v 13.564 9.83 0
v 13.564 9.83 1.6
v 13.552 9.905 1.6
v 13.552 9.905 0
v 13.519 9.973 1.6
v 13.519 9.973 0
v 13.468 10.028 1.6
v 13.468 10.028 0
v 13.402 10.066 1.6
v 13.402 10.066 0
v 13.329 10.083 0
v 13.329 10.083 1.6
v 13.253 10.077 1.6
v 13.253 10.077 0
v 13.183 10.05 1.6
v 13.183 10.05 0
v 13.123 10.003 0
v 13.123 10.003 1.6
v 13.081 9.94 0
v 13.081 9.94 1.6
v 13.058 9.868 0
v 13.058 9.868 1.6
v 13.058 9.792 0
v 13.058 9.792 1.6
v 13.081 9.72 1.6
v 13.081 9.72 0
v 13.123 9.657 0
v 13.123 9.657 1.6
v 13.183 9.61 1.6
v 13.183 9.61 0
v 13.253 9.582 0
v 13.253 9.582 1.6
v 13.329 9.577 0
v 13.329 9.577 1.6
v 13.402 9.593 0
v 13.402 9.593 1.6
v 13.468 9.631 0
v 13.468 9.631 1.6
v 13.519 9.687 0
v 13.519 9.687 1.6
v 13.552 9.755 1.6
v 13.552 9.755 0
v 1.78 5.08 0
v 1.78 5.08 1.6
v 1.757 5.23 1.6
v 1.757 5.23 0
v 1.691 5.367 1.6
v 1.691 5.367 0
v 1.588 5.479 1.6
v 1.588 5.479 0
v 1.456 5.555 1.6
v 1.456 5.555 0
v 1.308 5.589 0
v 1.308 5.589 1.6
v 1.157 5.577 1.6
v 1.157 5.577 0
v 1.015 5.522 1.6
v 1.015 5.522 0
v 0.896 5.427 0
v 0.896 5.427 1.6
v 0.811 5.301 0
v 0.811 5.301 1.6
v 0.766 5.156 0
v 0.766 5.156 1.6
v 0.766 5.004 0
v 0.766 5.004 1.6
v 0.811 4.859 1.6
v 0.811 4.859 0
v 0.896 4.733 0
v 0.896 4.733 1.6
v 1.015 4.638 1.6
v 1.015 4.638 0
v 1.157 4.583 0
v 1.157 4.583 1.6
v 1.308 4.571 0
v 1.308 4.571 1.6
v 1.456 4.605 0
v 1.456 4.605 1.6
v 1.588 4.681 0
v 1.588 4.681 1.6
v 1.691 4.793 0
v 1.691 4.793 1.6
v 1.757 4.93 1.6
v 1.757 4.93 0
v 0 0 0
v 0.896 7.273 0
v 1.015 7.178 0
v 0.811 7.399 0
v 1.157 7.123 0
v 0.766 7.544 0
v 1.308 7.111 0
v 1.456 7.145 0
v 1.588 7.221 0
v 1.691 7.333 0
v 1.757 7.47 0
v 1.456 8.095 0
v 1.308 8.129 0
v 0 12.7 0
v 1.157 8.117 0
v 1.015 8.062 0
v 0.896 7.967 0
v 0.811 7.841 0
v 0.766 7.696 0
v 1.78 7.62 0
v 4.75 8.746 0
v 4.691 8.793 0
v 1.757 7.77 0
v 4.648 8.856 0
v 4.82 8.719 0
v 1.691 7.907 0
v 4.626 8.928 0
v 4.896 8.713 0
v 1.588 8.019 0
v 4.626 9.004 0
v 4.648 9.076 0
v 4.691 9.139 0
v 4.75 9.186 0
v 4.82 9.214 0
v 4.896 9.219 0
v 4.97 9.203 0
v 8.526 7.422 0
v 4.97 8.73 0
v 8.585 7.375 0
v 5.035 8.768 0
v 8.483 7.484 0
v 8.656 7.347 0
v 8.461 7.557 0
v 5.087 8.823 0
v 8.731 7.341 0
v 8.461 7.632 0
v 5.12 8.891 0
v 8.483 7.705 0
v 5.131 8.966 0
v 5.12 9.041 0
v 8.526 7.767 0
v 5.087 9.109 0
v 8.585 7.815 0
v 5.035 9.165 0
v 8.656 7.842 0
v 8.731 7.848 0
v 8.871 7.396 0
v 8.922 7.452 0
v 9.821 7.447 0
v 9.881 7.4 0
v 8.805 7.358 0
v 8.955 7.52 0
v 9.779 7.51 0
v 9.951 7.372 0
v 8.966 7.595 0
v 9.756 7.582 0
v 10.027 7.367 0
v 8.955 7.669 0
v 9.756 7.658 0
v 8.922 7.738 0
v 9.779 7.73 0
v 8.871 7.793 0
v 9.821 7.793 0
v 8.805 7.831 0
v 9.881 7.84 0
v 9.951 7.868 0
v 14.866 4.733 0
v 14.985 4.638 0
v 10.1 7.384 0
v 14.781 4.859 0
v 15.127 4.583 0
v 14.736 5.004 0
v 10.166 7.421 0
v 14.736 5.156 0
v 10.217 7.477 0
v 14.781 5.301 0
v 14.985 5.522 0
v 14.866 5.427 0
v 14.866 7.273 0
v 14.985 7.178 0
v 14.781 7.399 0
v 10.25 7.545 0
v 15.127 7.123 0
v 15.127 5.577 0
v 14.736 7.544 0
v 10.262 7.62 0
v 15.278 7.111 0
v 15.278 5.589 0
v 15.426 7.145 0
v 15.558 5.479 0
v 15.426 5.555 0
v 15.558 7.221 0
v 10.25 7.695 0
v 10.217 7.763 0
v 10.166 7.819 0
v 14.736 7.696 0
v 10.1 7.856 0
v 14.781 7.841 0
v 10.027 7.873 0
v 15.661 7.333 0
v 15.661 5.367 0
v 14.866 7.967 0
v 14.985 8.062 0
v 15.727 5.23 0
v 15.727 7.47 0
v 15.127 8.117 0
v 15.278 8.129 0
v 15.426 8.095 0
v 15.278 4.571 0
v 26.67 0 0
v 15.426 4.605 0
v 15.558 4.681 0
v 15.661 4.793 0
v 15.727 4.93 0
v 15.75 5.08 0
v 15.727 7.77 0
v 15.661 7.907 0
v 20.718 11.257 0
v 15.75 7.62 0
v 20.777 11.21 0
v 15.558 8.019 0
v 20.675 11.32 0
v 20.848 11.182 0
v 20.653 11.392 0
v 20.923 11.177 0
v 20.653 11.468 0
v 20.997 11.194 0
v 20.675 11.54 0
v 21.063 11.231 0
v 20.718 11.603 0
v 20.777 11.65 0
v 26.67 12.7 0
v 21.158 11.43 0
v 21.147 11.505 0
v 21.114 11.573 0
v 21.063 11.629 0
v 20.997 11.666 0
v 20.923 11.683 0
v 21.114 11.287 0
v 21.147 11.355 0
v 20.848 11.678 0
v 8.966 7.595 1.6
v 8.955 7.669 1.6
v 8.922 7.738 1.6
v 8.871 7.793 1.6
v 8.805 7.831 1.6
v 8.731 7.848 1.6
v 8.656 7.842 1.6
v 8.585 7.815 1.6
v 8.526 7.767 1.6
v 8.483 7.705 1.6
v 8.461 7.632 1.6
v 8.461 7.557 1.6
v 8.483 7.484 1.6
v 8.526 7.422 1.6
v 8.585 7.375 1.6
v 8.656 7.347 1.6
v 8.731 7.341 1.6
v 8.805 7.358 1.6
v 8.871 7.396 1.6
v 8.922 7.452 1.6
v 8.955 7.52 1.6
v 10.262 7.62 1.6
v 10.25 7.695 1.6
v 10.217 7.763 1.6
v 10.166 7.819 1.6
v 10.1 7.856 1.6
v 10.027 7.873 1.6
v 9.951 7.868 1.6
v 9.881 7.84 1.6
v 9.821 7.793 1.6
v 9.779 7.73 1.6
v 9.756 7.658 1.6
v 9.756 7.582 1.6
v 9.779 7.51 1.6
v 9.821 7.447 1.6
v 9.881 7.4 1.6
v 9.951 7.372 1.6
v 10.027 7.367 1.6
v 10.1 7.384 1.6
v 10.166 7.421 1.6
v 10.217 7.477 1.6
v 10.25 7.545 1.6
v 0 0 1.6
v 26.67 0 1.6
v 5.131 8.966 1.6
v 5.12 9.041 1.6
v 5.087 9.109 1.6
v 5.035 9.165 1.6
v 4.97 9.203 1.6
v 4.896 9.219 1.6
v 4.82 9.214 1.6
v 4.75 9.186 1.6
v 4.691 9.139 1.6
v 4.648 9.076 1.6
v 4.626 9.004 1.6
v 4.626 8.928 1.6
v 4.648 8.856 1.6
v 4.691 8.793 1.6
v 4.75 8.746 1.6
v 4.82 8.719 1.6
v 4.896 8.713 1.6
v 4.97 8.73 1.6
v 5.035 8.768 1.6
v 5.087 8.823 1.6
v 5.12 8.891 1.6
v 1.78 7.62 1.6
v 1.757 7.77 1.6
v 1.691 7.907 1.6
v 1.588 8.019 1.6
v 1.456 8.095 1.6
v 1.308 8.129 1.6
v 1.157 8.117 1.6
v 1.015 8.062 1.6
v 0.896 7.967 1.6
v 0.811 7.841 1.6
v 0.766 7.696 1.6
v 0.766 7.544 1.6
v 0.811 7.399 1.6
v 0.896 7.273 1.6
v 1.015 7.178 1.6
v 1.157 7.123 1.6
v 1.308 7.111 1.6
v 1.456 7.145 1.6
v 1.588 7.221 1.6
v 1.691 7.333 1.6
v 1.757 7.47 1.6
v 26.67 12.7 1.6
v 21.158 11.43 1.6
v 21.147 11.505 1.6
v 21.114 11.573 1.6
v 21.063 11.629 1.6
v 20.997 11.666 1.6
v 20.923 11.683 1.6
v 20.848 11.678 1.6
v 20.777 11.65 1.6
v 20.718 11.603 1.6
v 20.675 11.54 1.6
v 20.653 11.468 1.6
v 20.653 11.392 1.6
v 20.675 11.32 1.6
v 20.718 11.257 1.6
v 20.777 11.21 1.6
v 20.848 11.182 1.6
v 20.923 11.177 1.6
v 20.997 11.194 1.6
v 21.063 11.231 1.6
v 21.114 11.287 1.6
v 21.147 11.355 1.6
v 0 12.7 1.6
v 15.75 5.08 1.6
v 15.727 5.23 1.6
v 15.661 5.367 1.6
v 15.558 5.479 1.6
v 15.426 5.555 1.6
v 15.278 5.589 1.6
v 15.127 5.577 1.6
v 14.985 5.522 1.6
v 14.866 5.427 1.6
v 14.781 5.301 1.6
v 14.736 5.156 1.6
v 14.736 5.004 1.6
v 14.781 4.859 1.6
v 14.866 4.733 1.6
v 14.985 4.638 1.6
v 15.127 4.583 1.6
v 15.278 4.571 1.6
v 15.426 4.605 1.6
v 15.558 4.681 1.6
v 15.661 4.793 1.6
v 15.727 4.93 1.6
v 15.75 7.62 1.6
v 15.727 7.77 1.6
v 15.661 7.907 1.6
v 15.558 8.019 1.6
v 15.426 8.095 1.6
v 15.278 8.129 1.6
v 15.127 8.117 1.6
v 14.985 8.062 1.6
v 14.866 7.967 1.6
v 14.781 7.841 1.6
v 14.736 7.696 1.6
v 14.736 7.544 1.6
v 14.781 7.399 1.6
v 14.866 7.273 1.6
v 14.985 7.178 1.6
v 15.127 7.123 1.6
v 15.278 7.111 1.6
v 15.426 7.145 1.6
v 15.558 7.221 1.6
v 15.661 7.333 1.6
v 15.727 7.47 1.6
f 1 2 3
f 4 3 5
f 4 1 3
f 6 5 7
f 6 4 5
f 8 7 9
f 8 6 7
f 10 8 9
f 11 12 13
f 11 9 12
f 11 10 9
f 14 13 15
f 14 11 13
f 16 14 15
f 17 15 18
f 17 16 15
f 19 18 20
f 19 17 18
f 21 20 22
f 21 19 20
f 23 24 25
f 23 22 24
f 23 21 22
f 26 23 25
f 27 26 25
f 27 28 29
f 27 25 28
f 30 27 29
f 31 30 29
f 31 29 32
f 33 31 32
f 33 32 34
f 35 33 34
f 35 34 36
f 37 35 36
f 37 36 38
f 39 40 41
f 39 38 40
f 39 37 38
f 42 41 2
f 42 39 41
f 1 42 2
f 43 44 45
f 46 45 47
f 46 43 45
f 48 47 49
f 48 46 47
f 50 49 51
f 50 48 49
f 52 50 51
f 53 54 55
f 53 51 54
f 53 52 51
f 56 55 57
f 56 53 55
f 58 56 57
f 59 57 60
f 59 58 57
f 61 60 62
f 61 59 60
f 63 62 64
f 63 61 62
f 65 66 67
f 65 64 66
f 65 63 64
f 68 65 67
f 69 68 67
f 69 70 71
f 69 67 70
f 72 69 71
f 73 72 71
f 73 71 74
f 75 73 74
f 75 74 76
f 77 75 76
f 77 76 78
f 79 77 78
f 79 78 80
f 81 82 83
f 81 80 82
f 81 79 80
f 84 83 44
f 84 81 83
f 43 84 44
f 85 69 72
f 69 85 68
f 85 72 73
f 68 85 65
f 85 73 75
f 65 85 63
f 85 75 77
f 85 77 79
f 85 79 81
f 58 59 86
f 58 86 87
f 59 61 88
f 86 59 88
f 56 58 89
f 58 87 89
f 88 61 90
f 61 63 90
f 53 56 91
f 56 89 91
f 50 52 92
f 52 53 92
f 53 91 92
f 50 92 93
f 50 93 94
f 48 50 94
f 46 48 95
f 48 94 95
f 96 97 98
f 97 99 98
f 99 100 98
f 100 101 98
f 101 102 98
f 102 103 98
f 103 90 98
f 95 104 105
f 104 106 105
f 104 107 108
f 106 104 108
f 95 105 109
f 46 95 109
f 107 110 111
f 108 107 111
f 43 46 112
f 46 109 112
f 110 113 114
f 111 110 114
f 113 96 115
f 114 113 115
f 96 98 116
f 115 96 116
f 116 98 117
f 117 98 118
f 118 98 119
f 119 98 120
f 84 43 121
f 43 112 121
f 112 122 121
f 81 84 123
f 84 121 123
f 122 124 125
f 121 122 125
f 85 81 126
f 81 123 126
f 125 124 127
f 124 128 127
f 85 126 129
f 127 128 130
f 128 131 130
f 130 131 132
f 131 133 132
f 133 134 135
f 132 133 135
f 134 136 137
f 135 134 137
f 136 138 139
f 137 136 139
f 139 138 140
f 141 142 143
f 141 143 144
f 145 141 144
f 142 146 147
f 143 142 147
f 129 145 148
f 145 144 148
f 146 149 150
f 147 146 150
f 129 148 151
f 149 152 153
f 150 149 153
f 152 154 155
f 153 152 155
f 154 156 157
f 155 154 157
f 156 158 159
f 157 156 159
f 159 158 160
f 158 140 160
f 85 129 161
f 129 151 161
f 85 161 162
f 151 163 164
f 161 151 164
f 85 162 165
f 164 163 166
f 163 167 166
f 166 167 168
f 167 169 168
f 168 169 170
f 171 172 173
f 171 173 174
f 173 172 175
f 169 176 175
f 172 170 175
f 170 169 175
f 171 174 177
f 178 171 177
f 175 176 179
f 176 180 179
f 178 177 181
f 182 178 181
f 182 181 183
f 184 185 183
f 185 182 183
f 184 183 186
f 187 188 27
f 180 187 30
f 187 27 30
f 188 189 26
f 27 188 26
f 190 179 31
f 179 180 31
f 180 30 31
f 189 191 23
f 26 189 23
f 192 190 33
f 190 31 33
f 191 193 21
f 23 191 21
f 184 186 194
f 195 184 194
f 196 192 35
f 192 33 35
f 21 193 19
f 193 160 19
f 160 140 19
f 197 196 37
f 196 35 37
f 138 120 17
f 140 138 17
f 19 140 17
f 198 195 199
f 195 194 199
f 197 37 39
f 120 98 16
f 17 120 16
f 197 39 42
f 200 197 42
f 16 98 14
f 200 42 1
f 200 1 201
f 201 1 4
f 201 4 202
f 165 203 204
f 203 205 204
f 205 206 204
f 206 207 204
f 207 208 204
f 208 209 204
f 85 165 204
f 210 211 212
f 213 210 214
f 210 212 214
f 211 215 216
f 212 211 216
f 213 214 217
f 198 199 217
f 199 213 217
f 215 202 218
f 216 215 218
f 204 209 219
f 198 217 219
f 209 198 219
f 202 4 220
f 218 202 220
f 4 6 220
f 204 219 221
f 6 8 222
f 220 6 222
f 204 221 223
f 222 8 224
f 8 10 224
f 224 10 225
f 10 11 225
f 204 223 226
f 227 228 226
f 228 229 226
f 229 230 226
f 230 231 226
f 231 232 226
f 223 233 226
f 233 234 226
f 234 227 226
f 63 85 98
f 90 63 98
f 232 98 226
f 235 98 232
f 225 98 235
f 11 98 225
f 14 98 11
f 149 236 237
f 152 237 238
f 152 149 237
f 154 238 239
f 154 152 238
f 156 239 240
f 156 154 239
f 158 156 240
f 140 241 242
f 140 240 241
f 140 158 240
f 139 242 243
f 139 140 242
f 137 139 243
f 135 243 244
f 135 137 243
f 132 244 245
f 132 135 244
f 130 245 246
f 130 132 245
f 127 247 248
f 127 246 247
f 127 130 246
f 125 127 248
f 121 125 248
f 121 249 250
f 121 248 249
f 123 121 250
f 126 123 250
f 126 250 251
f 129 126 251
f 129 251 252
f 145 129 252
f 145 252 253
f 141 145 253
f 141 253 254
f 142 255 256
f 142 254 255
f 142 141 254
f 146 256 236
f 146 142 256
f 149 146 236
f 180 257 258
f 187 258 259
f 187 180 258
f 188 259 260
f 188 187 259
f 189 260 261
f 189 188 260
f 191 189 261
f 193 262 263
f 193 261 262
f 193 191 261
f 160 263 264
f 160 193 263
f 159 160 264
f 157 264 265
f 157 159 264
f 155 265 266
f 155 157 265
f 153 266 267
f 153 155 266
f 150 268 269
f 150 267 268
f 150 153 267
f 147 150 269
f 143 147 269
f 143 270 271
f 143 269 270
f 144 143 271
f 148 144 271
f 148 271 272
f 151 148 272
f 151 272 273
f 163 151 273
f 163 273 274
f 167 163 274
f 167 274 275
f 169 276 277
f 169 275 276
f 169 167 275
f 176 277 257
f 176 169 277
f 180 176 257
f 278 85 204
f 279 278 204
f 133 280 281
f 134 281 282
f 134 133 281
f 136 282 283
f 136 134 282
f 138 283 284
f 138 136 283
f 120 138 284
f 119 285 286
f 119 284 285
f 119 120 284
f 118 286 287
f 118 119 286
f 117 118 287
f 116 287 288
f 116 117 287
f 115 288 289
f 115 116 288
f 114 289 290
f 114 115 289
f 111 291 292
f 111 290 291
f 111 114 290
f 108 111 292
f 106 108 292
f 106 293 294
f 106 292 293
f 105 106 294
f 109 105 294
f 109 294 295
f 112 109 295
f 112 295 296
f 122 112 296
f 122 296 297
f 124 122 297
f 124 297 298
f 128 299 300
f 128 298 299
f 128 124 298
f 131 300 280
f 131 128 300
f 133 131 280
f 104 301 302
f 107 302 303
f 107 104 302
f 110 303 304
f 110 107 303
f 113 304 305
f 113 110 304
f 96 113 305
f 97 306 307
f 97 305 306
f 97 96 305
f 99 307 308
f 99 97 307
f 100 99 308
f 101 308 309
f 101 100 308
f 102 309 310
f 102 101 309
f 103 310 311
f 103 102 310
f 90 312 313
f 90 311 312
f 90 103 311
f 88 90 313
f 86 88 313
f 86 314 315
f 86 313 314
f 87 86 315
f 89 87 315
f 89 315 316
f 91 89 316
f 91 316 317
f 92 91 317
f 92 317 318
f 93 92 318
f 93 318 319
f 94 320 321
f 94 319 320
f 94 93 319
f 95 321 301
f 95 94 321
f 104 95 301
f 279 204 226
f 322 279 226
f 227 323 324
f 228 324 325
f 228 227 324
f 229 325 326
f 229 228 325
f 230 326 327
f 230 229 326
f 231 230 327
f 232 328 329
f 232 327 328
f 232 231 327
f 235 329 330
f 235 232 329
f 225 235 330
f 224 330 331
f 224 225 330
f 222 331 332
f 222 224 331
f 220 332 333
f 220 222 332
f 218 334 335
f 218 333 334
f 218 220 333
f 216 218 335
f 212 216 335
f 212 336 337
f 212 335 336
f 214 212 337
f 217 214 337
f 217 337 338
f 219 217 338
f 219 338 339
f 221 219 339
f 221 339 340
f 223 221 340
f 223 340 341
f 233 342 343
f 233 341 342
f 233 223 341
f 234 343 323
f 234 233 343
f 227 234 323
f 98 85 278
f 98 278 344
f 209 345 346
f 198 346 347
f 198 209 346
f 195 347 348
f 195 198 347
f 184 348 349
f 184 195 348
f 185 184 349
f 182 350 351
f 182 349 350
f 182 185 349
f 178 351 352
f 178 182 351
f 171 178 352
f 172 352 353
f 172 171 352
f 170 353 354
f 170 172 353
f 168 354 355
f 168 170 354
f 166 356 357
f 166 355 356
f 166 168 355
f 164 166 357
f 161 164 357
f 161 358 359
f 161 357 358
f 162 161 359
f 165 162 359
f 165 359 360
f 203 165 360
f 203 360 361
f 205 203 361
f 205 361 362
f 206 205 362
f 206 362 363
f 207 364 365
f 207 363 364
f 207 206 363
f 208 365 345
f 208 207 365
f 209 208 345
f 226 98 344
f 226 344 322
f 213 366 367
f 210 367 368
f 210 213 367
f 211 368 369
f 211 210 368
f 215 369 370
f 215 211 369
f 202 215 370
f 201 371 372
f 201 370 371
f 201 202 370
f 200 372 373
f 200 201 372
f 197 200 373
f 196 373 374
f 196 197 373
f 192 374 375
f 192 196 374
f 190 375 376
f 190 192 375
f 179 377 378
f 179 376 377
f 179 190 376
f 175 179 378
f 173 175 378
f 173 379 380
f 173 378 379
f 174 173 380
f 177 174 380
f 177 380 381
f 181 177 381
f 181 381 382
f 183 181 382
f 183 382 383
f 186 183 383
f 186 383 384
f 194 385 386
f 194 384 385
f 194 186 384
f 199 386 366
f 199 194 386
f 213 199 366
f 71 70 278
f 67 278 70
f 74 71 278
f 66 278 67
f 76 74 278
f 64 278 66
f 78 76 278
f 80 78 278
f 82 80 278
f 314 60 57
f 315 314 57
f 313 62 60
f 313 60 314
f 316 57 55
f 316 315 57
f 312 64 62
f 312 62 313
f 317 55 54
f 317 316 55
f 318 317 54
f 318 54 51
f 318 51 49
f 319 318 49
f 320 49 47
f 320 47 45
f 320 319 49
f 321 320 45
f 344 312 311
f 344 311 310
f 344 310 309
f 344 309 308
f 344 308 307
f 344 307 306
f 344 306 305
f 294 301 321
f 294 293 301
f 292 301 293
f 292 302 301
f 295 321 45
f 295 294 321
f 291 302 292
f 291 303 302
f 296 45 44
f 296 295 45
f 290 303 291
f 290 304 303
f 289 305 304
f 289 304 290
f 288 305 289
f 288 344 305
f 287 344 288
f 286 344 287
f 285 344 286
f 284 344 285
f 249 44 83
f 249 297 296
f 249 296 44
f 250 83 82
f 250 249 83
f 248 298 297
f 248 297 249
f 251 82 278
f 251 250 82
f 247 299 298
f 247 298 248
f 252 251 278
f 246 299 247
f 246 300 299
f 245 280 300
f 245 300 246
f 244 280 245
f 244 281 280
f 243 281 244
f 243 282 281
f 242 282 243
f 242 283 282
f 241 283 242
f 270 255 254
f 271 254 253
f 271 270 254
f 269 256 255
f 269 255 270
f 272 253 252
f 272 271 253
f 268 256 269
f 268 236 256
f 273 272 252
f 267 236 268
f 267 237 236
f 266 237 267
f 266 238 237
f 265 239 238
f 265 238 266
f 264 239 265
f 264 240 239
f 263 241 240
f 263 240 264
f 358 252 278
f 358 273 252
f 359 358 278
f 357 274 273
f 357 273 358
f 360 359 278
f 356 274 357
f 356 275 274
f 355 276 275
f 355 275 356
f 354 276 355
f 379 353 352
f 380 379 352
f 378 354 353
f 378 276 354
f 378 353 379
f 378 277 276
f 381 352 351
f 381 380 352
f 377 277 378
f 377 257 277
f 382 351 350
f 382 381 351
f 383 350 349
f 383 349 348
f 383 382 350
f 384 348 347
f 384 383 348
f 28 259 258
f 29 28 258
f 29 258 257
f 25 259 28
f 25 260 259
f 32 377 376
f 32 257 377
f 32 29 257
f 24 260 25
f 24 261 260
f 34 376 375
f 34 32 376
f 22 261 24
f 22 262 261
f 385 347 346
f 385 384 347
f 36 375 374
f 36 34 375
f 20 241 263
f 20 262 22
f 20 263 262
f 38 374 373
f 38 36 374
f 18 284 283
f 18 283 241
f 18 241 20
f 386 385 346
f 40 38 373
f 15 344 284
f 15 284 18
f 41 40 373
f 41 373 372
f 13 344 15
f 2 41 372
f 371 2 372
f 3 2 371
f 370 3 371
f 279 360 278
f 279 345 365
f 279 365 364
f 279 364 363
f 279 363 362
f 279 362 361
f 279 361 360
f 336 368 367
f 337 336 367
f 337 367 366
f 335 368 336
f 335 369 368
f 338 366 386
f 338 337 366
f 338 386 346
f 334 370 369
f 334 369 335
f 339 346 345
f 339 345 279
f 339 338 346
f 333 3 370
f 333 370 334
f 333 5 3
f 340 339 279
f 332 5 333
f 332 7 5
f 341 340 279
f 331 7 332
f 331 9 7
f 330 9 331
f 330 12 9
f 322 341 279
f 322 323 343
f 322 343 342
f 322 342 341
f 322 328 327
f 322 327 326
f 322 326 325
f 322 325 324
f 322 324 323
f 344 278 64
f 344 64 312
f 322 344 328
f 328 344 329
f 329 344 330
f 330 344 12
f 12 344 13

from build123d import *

# Parameters (mm, degrees)
SKETCH1_W           = 26.67
SKETCH1_H           = 12.7
BOARD_OUTLINE_DEPTH = 1.6
SKETCH2_R           = 0.254
NPTH_DEPTH          = 30.582746661
SKETCH3_R           = 0.51
PTH_DEPTH           = 30.582746661


with BuildPart() as part:
    # Sketch1 → Board_Outline (new body)
    with BuildSketch(Plane.XY):
        with Locations((13.335, 6.35)):
            Rectangle(SKETCH1_W, SKETCH1_H)
    extrude(amount=BOARD_OUTLINE_DEPTH)

    # Sketch2 → NPTH (cut, through all)
    with BuildSketch(Plane.XY):
        with Locations((8.7122, 7.5946)):
            Circle(SKETCH2_R)
        with Locations((10.0076, 7.62)):
            Circle(SKETCH2_R)
        with Locations((13.3096, 9.8298)):
            Circle(SKETCH2_R)
        with Locations((20.9042, 11.43)):
            Circle(SKETCH2_R)
        with Locations((4.8768, 8.9662)):
            Circle(SKETCH2_R)
    extrude(amount=NPTH_DEPTH, mode=Mode.SUBTRACT)

    # Sketch3 → PTH (cut, through all)
    with BuildSketch(Plane.XY):
        with Locations((1.27, 7.62)):
            Circle(SKETCH3_R)
        with Locations((1.27, 5.08)):
            Circle(SKETCH3_R)
        with Locations((15.24, 7.62)):
            Circle(SKETCH3_R)
        with Locations((15.24, 5.08)):
            Circle(SKETCH3_R)
    extrude(amount=PTH_DEPTH, mode=Mode.SUBTRACT)


solid = part.part
